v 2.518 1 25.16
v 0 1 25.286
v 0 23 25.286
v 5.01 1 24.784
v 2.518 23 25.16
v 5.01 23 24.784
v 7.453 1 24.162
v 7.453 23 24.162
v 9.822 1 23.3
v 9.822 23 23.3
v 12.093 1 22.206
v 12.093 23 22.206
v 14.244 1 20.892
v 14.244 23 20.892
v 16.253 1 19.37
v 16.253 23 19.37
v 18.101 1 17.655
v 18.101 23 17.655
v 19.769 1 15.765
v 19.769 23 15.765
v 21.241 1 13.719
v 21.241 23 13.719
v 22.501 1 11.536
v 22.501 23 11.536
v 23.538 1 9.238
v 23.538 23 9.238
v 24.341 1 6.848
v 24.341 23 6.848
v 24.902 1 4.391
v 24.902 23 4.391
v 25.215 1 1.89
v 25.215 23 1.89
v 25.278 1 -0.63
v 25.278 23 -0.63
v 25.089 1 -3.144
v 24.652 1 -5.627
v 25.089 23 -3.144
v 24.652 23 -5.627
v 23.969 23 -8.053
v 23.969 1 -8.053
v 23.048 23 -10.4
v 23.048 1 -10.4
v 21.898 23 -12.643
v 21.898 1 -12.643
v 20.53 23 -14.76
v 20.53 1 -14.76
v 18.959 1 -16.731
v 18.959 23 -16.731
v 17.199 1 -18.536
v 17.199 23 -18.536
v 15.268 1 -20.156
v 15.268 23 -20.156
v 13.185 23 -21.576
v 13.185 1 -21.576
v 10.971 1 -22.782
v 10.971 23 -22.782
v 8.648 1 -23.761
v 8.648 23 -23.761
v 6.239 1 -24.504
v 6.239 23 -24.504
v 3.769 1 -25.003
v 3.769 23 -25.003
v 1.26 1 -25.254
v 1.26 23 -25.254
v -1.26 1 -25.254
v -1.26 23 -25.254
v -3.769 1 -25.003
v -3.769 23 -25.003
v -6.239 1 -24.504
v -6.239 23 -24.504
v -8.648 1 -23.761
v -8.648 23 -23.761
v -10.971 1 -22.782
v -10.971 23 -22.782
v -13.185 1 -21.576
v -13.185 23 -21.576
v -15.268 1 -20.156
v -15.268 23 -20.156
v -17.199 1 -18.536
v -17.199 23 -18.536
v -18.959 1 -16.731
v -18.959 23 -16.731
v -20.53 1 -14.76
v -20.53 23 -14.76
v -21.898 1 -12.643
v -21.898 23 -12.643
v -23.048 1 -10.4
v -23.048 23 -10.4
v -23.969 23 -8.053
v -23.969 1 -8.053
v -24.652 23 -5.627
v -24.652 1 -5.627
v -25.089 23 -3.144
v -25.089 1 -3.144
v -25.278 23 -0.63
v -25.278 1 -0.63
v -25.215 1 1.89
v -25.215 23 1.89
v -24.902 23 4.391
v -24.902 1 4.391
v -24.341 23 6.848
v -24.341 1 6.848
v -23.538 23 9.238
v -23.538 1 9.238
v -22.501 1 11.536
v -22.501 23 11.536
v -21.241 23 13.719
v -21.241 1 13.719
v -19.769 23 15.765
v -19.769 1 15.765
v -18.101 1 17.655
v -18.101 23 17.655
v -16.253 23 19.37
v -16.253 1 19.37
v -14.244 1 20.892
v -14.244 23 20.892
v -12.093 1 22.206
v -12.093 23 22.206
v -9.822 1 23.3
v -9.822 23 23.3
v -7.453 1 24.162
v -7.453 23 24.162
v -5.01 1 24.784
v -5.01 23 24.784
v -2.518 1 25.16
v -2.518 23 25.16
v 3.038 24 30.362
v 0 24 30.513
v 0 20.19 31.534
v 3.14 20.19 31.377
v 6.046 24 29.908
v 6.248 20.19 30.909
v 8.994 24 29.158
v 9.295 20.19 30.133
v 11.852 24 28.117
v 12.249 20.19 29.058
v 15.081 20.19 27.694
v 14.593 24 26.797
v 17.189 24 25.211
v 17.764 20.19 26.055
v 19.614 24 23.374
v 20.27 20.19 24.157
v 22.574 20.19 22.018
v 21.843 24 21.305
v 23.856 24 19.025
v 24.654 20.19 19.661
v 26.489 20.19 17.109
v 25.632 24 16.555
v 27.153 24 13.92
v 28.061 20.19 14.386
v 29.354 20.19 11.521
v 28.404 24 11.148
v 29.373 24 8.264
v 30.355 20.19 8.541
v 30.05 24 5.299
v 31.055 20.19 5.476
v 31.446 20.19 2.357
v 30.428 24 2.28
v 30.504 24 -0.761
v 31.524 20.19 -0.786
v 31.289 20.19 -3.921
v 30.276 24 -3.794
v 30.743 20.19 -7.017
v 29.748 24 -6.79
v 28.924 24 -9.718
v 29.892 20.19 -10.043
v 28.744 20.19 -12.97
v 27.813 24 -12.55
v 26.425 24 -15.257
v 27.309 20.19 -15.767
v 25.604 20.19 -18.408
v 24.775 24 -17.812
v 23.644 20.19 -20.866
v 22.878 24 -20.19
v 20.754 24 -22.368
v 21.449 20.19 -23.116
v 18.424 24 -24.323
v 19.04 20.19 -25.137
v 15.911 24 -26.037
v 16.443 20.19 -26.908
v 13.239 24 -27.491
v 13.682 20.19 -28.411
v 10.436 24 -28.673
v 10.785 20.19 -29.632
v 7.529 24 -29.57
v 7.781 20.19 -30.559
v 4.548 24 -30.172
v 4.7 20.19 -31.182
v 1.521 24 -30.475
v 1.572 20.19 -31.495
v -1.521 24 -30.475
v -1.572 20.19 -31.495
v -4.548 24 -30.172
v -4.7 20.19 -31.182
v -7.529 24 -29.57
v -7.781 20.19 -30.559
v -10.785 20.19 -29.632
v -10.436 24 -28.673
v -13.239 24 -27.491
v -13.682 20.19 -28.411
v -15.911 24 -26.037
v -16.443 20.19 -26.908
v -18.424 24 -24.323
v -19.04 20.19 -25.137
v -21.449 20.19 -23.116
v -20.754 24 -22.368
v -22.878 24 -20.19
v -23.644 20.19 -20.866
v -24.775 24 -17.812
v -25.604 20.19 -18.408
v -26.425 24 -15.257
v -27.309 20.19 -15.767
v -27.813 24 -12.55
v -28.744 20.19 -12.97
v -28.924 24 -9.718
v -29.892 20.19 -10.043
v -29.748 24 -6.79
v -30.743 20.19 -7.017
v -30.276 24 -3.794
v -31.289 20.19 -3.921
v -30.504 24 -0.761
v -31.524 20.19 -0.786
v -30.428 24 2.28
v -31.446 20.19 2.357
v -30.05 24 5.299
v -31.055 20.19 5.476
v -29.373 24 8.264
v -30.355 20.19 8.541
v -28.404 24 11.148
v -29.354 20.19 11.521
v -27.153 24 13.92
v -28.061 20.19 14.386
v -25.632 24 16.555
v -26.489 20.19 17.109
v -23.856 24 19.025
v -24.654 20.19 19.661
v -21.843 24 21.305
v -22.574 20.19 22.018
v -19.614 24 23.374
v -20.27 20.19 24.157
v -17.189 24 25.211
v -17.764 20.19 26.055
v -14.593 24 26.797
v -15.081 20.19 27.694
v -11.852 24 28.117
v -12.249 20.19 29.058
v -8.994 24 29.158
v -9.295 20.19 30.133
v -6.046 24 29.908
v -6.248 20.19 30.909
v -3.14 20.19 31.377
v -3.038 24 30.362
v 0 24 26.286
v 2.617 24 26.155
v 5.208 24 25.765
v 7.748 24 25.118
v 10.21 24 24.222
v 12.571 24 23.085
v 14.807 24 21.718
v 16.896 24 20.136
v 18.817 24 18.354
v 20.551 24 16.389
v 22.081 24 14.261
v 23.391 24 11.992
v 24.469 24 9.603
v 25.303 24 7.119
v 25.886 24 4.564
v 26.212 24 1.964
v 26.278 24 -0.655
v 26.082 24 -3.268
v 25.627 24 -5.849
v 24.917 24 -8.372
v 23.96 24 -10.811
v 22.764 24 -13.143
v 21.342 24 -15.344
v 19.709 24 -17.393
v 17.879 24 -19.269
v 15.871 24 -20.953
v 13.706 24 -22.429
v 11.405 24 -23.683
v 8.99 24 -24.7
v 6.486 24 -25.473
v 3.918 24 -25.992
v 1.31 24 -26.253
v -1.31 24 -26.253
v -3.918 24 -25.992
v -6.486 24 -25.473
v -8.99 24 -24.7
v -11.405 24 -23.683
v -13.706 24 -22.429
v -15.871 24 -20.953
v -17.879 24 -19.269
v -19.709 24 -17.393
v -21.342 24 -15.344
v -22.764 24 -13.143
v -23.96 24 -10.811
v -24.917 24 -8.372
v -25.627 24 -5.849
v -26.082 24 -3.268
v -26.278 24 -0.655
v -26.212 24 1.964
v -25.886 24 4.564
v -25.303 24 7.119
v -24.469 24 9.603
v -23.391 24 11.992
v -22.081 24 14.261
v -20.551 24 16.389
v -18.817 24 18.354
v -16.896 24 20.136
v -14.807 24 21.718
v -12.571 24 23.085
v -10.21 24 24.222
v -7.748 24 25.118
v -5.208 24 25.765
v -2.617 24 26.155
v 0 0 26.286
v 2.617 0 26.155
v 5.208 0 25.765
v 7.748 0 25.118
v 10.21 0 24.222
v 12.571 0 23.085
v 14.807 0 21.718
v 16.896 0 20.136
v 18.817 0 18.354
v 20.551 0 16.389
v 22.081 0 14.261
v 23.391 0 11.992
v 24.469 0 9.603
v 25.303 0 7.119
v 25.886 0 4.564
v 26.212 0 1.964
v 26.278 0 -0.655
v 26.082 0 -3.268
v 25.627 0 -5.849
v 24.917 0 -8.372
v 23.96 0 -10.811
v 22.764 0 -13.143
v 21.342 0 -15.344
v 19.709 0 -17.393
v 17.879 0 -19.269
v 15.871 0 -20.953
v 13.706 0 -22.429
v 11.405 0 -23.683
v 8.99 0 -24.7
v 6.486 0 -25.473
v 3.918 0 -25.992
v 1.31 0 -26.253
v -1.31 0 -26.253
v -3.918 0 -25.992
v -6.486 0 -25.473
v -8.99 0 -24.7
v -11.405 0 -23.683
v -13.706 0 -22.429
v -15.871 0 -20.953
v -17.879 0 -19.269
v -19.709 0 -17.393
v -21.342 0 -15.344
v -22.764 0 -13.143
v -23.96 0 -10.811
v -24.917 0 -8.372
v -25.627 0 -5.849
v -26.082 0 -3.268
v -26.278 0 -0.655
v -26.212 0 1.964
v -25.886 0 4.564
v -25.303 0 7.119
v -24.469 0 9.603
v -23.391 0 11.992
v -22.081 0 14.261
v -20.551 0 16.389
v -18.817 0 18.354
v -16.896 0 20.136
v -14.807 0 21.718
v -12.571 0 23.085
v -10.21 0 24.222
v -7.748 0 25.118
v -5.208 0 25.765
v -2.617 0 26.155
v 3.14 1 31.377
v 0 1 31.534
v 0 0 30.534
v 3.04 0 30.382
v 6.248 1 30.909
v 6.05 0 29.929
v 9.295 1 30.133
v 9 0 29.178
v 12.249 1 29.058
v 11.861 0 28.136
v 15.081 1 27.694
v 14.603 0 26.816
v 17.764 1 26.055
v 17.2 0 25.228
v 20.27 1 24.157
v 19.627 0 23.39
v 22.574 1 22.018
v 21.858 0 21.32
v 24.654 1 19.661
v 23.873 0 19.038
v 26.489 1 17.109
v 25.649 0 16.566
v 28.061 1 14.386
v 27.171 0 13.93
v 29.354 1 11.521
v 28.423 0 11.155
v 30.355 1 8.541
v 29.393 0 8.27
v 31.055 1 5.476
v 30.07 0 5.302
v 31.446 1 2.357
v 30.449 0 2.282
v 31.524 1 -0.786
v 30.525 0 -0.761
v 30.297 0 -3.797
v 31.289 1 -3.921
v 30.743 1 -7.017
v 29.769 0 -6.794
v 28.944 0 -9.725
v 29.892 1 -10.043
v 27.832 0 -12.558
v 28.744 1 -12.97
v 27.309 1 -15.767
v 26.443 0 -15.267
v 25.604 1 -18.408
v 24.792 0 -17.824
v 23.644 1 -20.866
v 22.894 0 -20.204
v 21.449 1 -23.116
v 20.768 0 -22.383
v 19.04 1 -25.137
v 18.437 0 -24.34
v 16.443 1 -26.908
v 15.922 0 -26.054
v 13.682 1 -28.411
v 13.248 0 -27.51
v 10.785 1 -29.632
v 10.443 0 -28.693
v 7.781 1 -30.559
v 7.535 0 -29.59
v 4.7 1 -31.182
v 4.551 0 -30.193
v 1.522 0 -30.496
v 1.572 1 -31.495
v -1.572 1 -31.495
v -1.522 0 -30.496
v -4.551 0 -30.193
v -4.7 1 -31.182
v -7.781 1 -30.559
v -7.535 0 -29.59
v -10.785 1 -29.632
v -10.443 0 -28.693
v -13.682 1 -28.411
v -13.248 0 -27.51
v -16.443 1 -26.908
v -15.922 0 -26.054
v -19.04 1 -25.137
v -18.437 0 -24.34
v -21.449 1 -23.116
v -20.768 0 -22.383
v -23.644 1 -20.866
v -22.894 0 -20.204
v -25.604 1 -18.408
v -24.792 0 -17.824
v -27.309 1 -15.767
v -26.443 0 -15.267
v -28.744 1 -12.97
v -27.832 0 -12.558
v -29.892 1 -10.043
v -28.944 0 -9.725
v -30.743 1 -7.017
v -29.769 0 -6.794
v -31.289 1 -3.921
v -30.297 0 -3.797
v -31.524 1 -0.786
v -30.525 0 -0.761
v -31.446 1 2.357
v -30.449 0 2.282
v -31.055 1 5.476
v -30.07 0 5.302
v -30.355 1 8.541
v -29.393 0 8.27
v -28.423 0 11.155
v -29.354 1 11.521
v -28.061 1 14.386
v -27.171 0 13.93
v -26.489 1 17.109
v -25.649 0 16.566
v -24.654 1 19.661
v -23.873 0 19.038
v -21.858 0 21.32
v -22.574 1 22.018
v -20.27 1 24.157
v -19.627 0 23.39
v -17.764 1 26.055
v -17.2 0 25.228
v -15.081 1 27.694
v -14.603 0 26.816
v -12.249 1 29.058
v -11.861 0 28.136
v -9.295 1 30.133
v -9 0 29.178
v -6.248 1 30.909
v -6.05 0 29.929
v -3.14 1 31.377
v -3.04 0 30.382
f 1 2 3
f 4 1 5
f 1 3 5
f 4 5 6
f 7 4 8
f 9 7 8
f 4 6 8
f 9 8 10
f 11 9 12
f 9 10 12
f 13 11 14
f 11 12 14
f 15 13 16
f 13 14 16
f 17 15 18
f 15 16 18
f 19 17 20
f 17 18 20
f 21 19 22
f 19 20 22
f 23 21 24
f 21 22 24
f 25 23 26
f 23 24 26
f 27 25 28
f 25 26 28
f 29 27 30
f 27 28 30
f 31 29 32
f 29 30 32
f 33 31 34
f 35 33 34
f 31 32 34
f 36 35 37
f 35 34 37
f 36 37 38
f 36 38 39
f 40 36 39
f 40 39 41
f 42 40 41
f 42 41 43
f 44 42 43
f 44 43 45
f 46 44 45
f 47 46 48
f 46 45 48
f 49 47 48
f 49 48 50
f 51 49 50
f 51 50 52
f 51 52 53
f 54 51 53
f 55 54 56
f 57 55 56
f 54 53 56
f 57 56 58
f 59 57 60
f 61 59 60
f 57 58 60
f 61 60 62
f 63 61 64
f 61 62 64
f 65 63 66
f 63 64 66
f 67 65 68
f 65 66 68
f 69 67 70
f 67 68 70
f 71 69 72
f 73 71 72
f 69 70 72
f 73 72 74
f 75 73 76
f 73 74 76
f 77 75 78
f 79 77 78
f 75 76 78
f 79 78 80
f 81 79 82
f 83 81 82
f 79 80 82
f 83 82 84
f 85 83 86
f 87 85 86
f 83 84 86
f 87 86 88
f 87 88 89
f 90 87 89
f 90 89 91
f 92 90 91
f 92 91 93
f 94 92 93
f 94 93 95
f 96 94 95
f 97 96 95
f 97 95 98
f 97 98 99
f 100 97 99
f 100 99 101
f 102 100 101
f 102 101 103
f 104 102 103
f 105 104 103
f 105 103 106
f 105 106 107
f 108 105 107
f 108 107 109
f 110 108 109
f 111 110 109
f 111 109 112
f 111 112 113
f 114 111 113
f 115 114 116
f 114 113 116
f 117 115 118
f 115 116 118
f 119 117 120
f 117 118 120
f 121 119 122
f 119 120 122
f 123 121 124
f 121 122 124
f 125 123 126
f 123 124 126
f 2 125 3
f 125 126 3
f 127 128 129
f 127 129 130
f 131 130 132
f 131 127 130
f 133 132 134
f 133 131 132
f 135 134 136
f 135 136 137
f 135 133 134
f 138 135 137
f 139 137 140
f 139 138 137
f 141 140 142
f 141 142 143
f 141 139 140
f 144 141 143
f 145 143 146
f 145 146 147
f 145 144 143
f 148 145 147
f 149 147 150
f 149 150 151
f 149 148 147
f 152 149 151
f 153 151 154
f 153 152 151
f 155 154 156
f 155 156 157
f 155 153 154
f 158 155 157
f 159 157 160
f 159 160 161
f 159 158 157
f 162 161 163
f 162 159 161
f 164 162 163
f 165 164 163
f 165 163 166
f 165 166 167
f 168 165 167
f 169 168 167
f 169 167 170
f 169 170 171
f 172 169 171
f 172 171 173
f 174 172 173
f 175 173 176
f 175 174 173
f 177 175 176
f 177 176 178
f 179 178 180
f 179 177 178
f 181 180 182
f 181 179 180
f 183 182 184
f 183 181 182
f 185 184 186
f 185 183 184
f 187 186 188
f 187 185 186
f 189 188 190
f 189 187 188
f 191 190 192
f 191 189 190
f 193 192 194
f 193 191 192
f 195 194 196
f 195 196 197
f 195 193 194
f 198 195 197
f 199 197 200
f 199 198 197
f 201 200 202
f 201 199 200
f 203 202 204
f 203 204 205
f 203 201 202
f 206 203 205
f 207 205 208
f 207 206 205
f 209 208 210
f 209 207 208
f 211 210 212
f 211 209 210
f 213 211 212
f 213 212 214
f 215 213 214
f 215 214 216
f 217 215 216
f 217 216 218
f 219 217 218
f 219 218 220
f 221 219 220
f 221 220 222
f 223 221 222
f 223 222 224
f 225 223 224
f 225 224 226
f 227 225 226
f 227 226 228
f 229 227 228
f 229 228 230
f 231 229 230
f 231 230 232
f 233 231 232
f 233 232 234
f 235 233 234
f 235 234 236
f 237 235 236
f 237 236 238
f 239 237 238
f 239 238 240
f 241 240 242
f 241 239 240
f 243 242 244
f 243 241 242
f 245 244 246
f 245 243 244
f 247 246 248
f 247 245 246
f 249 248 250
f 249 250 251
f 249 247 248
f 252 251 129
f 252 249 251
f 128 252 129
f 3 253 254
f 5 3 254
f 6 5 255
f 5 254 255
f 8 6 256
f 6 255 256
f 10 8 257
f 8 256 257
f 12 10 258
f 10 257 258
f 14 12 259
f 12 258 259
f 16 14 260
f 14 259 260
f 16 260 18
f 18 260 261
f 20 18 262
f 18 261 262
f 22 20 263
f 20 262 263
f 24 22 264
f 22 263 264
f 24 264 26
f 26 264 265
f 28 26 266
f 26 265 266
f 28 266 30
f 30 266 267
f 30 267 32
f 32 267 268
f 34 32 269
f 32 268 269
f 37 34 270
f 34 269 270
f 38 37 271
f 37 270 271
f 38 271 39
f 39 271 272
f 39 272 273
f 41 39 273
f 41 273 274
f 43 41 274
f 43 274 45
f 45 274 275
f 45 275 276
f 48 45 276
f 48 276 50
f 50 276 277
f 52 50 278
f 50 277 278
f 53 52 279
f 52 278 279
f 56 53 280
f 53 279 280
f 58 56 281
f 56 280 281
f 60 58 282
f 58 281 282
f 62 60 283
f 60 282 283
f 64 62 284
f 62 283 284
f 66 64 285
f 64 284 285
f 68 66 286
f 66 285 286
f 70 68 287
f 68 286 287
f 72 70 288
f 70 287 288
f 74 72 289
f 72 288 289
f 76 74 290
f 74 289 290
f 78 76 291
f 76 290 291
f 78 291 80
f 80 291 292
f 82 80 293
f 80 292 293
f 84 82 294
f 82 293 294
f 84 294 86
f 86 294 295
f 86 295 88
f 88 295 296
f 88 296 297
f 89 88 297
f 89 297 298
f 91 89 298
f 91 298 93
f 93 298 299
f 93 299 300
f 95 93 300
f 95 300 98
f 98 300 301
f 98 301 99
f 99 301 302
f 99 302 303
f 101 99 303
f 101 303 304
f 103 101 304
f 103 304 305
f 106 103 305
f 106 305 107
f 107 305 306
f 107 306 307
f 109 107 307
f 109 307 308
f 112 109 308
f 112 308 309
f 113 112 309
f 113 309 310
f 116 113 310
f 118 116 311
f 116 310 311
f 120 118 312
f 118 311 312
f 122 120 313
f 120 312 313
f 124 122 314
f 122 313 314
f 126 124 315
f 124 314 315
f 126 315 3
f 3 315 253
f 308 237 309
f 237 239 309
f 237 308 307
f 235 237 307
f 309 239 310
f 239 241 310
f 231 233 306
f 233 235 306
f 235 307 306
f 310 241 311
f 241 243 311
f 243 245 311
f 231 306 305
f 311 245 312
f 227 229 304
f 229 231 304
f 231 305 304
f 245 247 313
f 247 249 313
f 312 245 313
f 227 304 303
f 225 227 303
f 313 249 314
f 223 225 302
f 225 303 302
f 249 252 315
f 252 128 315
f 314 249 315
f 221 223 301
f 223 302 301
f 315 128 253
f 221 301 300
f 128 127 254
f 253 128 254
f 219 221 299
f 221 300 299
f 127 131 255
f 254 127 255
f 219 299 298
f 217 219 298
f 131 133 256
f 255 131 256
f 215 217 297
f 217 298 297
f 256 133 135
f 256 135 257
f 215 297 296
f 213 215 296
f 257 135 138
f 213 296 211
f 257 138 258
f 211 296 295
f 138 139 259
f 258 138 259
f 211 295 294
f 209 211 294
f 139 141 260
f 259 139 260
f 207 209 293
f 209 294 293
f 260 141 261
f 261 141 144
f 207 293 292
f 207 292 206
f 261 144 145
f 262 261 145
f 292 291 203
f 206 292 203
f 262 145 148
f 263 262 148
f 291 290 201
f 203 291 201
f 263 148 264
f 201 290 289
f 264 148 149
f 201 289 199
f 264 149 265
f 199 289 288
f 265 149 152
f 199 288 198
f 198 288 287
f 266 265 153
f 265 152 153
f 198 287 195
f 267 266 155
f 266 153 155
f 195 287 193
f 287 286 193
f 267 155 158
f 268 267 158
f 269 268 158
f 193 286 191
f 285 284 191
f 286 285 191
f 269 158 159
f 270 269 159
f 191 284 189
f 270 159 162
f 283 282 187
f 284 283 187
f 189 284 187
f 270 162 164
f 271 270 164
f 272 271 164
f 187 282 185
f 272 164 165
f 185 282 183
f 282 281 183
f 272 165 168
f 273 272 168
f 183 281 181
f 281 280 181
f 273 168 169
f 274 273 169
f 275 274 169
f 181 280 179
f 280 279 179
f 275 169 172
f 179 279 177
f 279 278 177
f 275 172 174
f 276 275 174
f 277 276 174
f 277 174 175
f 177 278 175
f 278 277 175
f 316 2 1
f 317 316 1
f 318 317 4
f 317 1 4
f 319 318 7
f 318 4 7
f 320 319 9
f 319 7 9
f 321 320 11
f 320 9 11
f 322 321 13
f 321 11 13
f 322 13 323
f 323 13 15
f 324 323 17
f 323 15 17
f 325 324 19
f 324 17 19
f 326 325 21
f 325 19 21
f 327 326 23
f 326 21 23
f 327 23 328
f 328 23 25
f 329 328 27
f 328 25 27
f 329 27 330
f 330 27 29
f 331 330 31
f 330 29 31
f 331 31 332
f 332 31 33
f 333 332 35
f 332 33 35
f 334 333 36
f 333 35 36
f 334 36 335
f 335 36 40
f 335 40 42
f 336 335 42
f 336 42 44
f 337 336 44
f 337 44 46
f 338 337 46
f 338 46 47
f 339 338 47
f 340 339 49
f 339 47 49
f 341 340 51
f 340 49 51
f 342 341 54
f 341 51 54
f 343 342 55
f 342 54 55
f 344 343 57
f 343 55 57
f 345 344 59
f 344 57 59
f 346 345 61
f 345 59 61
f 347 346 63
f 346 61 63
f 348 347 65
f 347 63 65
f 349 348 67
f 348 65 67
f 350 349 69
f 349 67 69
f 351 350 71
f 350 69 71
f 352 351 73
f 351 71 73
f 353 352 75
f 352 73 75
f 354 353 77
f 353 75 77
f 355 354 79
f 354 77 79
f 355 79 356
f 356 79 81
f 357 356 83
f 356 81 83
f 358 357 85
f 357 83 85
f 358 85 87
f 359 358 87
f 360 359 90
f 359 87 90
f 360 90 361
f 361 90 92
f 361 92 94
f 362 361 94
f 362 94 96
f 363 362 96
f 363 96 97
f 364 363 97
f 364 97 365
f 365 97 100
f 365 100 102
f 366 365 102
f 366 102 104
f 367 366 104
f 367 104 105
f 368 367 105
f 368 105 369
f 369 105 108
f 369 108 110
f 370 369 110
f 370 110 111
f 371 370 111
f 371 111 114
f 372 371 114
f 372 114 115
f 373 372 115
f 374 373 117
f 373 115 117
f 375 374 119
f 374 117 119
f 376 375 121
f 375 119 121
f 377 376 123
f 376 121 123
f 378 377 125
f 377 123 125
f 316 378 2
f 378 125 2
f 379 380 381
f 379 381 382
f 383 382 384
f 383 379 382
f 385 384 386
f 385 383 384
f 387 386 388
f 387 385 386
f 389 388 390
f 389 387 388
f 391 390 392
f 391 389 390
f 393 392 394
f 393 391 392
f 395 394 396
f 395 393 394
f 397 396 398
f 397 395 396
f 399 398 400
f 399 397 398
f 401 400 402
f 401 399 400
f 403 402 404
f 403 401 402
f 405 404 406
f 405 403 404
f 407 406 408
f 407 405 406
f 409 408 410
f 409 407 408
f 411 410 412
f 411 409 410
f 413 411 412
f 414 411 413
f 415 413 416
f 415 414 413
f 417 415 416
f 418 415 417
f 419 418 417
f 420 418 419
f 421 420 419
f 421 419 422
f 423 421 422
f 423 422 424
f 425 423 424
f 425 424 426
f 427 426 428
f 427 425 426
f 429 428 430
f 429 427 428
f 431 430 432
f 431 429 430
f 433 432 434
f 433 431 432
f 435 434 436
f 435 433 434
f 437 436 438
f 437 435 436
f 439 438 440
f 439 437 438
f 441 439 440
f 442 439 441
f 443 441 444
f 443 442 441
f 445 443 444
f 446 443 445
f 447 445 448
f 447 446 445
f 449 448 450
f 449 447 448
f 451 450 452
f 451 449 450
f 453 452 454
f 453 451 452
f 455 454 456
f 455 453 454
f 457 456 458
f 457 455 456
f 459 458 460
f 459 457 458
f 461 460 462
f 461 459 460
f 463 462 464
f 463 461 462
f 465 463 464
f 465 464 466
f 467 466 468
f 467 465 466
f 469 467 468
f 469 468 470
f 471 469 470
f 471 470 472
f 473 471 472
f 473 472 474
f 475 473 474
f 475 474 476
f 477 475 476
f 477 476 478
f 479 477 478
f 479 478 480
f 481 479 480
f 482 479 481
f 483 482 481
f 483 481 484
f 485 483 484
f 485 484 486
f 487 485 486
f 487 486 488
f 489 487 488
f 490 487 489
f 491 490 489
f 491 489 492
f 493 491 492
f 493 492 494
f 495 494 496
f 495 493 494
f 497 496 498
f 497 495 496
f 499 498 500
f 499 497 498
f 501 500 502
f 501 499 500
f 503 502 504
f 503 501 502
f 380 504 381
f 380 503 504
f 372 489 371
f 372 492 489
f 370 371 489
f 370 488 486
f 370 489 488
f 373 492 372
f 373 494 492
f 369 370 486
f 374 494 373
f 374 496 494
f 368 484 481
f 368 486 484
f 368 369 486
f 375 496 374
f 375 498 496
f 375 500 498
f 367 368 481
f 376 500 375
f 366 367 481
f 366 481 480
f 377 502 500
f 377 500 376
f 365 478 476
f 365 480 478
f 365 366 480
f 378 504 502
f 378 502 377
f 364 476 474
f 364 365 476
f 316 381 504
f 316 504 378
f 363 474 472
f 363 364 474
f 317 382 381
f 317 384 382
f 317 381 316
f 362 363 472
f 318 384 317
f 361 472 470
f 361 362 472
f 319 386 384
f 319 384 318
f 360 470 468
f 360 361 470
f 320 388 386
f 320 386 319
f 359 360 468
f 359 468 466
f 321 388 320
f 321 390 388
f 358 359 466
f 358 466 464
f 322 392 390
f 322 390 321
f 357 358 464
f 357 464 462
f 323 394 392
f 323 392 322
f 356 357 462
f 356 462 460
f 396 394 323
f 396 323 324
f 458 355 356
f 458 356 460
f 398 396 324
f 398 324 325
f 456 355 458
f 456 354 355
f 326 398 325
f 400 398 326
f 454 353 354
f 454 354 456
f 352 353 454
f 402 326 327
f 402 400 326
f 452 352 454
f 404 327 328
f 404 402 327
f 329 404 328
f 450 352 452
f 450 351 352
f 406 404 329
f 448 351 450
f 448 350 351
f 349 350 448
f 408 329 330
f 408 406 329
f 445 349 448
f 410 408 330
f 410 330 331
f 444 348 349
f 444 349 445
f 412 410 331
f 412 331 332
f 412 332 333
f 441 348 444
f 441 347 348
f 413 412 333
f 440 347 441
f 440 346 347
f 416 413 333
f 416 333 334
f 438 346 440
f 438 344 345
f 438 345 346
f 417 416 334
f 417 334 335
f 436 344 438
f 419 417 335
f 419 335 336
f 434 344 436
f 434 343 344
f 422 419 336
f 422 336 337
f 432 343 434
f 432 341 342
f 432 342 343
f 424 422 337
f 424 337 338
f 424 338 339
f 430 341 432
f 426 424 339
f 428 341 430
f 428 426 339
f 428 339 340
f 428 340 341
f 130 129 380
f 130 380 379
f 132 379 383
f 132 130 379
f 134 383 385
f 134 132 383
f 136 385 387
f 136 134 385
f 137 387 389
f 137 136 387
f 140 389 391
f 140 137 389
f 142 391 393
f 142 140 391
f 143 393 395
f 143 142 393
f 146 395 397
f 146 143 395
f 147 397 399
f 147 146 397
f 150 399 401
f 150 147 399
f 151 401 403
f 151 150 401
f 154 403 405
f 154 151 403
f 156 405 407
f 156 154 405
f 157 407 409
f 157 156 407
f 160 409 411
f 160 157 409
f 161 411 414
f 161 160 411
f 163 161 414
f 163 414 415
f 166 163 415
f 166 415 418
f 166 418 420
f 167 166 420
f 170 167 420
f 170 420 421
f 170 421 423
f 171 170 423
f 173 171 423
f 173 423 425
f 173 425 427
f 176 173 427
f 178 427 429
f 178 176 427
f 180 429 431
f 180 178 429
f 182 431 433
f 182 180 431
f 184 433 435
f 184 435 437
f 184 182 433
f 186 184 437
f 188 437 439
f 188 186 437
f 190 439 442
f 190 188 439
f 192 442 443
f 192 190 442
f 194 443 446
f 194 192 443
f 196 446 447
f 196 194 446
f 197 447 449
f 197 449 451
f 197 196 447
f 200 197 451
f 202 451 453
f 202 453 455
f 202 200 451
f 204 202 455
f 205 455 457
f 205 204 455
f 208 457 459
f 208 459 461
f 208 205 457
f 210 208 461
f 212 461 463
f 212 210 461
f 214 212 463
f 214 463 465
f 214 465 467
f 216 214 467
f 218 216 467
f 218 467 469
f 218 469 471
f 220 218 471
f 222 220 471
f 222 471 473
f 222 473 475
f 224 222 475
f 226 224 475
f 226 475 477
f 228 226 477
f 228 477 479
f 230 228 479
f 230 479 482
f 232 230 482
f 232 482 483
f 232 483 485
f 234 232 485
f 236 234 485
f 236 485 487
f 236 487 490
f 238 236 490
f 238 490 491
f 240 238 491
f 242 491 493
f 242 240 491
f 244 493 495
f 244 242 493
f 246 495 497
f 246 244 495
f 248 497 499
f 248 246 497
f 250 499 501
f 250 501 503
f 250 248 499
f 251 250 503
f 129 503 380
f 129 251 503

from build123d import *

# Parameters (mm, degrees)
F0_W     = 24
F0_H     = 6.2484
F2_SIZE  = 1
F3_SIZE2 = 1.020886
F3_SIZE  = 3.81


with BuildPart() as f1:
    # F0 (on Right) → F1 (revolve)
    with BuildSketch(Plane.YZ):
        with Locations((12, 28.4099)):
            Rectangle(F0_W, F0_H)
    revolve(axis=Axis((0, 10.069529, 0), (0, 1, 0)))

    # F2
    f2_edges = [f1.edges().sort_by_distance(p)[0] for p in [
        (0, 0, -25.2857),
        (0, 0, -31.5341),
        (0, 24, -25.2857),
    ]]
    chamfer(f2_edges, length=F2_SIZE)

    # F3
    f3_edges = [f1.edges().sort_by_distance(p)[0] for p in [
        (0, 24, -31.5341),
    ]]
    chamfer(f3_edges, length=F3_SIZE, length2=F3_SIZE2)


solid = f1.part
